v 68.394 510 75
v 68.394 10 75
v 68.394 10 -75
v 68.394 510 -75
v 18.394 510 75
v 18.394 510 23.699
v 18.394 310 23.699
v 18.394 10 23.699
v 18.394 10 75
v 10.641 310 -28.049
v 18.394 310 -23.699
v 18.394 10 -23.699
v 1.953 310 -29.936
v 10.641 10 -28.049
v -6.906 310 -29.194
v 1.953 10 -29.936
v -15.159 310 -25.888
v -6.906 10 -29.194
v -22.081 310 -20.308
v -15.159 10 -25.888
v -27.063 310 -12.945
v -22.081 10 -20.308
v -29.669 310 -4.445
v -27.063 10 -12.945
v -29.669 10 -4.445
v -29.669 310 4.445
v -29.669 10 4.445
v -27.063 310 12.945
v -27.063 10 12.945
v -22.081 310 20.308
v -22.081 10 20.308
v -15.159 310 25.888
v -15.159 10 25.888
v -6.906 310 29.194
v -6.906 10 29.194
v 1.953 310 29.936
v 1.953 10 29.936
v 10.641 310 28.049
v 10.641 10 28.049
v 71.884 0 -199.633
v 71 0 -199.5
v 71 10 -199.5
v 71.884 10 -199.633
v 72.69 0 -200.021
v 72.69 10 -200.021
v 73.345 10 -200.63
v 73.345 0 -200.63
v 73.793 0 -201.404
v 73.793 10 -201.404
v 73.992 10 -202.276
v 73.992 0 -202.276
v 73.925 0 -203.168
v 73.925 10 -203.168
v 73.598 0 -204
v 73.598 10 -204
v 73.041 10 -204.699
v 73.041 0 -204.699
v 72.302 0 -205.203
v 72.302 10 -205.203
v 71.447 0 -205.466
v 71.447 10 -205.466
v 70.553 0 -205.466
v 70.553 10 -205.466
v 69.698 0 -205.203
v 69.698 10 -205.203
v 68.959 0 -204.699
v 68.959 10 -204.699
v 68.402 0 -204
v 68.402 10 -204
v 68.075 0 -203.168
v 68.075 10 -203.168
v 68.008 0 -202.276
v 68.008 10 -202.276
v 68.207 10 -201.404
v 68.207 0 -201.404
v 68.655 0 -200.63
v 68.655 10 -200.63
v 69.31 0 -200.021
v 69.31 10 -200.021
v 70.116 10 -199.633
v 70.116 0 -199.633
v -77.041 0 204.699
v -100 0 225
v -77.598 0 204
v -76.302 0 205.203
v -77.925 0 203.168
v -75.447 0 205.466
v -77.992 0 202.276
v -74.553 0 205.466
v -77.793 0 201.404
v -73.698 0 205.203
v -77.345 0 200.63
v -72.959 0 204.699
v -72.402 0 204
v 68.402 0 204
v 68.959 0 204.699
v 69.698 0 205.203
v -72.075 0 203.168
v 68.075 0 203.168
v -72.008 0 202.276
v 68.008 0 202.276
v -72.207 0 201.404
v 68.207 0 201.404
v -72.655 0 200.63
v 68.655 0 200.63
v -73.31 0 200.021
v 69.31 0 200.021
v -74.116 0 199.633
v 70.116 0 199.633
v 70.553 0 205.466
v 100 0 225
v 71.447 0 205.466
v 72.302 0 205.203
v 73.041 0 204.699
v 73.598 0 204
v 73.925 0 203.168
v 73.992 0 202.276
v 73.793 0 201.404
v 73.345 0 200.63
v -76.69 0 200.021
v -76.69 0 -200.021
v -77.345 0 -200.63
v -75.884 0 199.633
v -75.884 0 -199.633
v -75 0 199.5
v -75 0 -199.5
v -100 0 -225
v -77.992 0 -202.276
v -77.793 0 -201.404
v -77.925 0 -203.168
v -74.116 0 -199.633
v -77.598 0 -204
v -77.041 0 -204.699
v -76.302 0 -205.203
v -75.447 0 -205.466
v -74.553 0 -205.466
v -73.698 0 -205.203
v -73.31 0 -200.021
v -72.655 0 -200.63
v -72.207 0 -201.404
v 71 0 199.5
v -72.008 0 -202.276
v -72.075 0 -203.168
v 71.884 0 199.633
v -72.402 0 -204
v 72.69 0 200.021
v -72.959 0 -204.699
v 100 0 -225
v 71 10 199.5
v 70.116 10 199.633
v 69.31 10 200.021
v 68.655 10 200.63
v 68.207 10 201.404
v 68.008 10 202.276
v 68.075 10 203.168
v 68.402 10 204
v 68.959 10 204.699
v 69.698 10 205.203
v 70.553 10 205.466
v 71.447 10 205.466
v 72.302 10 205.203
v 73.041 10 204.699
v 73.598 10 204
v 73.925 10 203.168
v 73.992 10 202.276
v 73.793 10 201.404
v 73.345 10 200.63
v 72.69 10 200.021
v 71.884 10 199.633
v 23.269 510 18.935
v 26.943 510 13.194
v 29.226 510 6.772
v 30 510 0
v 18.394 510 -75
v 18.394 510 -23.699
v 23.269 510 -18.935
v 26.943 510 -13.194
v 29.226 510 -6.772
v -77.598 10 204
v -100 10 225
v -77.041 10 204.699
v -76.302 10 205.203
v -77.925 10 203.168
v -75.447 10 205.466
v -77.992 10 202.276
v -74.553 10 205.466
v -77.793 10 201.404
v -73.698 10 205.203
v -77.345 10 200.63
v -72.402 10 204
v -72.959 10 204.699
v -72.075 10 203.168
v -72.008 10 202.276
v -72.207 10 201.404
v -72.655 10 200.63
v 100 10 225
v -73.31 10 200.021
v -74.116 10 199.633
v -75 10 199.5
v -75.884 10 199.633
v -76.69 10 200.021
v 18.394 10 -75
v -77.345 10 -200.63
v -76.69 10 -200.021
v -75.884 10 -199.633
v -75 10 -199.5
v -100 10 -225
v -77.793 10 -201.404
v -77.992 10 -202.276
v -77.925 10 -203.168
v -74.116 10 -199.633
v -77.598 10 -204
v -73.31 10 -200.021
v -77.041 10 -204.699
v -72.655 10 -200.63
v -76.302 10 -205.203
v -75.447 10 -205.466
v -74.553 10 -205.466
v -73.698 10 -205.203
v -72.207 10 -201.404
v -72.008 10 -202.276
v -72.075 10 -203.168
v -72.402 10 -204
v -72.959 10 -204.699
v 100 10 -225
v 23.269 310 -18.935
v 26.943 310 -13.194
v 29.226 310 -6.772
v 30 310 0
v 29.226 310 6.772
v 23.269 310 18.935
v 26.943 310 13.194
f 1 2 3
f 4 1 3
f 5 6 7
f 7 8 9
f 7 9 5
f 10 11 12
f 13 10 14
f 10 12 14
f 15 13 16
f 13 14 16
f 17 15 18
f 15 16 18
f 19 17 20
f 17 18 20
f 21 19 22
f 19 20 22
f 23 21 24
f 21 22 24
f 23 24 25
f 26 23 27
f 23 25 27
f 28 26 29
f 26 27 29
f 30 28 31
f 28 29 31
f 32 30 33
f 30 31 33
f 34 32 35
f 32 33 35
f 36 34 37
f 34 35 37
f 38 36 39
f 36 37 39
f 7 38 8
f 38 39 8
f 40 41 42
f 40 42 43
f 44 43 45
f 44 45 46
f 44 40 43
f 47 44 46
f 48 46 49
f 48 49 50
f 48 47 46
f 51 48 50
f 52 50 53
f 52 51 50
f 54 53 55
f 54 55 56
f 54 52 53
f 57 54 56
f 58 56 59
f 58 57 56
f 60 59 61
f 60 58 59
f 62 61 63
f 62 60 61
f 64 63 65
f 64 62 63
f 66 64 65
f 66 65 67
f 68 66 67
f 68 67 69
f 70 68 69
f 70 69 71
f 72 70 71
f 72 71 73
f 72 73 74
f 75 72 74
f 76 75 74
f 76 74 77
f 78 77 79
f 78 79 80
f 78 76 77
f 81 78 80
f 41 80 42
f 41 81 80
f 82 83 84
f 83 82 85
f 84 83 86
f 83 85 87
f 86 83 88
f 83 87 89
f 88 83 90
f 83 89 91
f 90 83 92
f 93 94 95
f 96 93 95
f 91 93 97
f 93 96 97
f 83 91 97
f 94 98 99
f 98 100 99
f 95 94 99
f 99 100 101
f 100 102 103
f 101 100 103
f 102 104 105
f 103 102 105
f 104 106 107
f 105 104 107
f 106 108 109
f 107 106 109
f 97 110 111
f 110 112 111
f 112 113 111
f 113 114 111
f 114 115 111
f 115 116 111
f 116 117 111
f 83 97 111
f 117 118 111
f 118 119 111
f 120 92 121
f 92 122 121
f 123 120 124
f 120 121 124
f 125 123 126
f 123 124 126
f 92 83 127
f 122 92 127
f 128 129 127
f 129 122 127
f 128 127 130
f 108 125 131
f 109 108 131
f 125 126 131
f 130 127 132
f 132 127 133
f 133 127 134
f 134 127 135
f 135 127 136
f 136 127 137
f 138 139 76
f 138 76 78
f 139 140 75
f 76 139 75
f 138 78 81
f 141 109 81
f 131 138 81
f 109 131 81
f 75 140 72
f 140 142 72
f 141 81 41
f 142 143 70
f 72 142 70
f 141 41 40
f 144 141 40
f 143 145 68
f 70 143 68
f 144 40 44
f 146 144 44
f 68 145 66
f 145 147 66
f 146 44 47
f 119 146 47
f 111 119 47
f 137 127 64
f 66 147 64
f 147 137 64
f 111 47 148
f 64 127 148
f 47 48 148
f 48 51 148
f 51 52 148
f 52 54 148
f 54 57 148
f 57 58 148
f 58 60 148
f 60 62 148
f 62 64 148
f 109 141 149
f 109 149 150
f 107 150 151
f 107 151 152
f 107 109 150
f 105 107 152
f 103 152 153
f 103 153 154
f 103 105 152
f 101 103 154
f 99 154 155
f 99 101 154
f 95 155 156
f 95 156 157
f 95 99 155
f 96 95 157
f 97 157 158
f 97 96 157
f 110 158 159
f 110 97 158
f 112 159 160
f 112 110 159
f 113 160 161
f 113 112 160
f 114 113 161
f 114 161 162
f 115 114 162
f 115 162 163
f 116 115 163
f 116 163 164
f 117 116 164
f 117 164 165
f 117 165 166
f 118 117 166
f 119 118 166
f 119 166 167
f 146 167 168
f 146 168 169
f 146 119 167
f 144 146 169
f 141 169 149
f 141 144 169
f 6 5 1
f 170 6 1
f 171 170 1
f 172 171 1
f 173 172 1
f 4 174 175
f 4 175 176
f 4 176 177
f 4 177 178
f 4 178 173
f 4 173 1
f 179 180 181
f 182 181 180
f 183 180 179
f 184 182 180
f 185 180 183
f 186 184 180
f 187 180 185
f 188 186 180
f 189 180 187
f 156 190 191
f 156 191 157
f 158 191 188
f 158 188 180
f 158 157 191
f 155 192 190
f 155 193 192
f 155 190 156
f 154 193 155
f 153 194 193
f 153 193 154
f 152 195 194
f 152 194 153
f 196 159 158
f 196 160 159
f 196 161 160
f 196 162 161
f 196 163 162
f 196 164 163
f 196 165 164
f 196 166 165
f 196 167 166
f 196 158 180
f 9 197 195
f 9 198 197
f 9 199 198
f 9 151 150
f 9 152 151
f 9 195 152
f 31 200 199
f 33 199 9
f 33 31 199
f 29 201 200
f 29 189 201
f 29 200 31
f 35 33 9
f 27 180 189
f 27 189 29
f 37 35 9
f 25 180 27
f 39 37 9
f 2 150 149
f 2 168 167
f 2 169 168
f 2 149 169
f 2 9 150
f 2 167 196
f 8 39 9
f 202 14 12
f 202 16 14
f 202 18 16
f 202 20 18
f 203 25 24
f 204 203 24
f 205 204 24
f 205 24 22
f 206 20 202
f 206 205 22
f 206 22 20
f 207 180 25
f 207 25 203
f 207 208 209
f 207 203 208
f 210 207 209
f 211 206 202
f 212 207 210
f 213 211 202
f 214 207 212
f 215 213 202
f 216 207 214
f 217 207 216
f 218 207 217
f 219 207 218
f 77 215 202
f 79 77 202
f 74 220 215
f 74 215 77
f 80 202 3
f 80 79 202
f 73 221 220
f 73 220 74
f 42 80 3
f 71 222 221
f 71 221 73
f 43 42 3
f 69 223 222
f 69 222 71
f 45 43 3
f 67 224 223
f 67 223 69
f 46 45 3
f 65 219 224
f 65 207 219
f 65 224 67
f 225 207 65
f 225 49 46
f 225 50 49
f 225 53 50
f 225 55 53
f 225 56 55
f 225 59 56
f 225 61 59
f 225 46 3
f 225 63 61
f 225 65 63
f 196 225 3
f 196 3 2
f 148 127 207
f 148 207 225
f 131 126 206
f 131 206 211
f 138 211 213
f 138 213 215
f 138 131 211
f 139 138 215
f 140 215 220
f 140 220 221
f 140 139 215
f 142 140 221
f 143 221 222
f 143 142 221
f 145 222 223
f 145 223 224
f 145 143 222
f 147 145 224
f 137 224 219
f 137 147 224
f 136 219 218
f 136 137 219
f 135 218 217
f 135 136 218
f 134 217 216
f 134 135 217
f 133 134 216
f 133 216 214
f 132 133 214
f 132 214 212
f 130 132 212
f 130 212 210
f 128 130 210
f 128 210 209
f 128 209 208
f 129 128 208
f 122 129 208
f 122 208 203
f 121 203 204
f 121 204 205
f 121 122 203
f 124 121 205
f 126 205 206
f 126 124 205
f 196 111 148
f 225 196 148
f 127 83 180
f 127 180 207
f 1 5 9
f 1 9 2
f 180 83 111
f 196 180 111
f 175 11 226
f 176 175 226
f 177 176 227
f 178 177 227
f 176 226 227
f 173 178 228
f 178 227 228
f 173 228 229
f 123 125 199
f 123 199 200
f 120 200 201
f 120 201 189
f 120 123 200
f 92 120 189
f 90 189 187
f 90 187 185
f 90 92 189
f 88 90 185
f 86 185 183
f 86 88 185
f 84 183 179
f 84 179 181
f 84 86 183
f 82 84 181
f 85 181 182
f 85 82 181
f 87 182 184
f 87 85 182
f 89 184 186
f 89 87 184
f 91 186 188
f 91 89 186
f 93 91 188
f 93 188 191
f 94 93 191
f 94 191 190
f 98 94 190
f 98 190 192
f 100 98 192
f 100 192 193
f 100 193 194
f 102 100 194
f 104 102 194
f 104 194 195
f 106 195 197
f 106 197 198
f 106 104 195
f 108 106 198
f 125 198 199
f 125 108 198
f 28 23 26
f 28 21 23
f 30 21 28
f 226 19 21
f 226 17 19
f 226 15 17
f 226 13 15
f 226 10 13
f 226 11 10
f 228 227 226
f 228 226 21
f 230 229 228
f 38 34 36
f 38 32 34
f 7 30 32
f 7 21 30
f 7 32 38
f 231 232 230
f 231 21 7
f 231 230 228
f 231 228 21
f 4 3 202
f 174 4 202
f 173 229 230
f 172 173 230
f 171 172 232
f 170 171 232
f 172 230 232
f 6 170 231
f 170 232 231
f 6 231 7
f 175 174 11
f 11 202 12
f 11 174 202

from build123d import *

# Parameters (mm, degrees)
SKETCH1_W           = 200
SKETCH1_H           = 450
SKETCH1_R           = 3
BOSS_EXTRUDE1_DEPTH = 10
BOSS_EXTRUDE2_DEPTH = 300
BOSS_EXTRUDE3_DEPTH = 500


with BuildPart() as part:
    # Sketch1 → Boss-Extrude1 (new body)
    with BuildSketch(Plane(origin=(0, 0, 0), x_dir=(1, 0, 0), z_dir=(0, 1, 0))):
        Rectangle(SKETCH1_W, SKETCH1_H)
        with Locations((-75, 202.5)):
            Circle(SKETCH1_R, mode=Mode.SUBTRACT)
        with Locations((71, 202.5)):
            Circle(SKETCH1_R, mode=Mode.SUBTRACT)
        with Locations((71, -202.5)):
            Circle(SKETCH1_R, mode=Mode.SUBTRACT)
        with Locations((-75, -202.5)):
            Circle(SKETCH1_R, mode=Mode.SUBTRACT)
    extrude(amount=BOSS_EXTRUDE1_DEPTH)

    # Sketch2 → Boss-Extrude2 (add)
    with BuildSketch(Plane(origin=(0, 10, 0), x_dir=(1, 0, 0), z_dir=(0, 1, 0))):
        with BuildLine():
            ThreePointArc((30, 0), (26.942793817, 13.194160122), (18.394275911, 23.699169051))
            ThreePointArc((18.394275911, 23.699169051), (-13.194160122, 26.942793817), (-30, 0))
            ThreePointArc((-30, 0), (-13.194160122, -26.942793817), (18.394275911, -23.699169051))
            ThreePointArc((18.394275911, -23.699169051), (26.942793817, -13.194160122), (30, 0))
        make_face()
    extrude(amount=BOSS_EXTRUDE2_DEPTH)

    # Sketch2<3> → Boss-Extrude3 (add)
    with BuildSketch(Plane(origin=(0, 10, 0), x_dir=(1, 0, 0), z_dir=(0, 1, 0))):
        with BuildLine():
            Line((18.394275911, 75), (18.394275911, 23.699169051))
            ThreePointArc((18.394275911, 23.699169051), (26.942793817, 13.194160122), (30, 0))
            ThreePointArc((30, 0), (26.942793817, -13.194160122), (18.394275911, -23.699169051))
            Line((18.394275911, -23.699169051), (18.394275911, -75))
            Line((18.394275911, -75), (68.394275911, -75))
            Line((68.394275911, -75), (68.394275911, 75))
            Line((68.394275911, 75), (18.394275911, 75))
        make_face()
    extrude(amount=BOSS_EXTRUDE3_DEPTH)


solid = part.part
